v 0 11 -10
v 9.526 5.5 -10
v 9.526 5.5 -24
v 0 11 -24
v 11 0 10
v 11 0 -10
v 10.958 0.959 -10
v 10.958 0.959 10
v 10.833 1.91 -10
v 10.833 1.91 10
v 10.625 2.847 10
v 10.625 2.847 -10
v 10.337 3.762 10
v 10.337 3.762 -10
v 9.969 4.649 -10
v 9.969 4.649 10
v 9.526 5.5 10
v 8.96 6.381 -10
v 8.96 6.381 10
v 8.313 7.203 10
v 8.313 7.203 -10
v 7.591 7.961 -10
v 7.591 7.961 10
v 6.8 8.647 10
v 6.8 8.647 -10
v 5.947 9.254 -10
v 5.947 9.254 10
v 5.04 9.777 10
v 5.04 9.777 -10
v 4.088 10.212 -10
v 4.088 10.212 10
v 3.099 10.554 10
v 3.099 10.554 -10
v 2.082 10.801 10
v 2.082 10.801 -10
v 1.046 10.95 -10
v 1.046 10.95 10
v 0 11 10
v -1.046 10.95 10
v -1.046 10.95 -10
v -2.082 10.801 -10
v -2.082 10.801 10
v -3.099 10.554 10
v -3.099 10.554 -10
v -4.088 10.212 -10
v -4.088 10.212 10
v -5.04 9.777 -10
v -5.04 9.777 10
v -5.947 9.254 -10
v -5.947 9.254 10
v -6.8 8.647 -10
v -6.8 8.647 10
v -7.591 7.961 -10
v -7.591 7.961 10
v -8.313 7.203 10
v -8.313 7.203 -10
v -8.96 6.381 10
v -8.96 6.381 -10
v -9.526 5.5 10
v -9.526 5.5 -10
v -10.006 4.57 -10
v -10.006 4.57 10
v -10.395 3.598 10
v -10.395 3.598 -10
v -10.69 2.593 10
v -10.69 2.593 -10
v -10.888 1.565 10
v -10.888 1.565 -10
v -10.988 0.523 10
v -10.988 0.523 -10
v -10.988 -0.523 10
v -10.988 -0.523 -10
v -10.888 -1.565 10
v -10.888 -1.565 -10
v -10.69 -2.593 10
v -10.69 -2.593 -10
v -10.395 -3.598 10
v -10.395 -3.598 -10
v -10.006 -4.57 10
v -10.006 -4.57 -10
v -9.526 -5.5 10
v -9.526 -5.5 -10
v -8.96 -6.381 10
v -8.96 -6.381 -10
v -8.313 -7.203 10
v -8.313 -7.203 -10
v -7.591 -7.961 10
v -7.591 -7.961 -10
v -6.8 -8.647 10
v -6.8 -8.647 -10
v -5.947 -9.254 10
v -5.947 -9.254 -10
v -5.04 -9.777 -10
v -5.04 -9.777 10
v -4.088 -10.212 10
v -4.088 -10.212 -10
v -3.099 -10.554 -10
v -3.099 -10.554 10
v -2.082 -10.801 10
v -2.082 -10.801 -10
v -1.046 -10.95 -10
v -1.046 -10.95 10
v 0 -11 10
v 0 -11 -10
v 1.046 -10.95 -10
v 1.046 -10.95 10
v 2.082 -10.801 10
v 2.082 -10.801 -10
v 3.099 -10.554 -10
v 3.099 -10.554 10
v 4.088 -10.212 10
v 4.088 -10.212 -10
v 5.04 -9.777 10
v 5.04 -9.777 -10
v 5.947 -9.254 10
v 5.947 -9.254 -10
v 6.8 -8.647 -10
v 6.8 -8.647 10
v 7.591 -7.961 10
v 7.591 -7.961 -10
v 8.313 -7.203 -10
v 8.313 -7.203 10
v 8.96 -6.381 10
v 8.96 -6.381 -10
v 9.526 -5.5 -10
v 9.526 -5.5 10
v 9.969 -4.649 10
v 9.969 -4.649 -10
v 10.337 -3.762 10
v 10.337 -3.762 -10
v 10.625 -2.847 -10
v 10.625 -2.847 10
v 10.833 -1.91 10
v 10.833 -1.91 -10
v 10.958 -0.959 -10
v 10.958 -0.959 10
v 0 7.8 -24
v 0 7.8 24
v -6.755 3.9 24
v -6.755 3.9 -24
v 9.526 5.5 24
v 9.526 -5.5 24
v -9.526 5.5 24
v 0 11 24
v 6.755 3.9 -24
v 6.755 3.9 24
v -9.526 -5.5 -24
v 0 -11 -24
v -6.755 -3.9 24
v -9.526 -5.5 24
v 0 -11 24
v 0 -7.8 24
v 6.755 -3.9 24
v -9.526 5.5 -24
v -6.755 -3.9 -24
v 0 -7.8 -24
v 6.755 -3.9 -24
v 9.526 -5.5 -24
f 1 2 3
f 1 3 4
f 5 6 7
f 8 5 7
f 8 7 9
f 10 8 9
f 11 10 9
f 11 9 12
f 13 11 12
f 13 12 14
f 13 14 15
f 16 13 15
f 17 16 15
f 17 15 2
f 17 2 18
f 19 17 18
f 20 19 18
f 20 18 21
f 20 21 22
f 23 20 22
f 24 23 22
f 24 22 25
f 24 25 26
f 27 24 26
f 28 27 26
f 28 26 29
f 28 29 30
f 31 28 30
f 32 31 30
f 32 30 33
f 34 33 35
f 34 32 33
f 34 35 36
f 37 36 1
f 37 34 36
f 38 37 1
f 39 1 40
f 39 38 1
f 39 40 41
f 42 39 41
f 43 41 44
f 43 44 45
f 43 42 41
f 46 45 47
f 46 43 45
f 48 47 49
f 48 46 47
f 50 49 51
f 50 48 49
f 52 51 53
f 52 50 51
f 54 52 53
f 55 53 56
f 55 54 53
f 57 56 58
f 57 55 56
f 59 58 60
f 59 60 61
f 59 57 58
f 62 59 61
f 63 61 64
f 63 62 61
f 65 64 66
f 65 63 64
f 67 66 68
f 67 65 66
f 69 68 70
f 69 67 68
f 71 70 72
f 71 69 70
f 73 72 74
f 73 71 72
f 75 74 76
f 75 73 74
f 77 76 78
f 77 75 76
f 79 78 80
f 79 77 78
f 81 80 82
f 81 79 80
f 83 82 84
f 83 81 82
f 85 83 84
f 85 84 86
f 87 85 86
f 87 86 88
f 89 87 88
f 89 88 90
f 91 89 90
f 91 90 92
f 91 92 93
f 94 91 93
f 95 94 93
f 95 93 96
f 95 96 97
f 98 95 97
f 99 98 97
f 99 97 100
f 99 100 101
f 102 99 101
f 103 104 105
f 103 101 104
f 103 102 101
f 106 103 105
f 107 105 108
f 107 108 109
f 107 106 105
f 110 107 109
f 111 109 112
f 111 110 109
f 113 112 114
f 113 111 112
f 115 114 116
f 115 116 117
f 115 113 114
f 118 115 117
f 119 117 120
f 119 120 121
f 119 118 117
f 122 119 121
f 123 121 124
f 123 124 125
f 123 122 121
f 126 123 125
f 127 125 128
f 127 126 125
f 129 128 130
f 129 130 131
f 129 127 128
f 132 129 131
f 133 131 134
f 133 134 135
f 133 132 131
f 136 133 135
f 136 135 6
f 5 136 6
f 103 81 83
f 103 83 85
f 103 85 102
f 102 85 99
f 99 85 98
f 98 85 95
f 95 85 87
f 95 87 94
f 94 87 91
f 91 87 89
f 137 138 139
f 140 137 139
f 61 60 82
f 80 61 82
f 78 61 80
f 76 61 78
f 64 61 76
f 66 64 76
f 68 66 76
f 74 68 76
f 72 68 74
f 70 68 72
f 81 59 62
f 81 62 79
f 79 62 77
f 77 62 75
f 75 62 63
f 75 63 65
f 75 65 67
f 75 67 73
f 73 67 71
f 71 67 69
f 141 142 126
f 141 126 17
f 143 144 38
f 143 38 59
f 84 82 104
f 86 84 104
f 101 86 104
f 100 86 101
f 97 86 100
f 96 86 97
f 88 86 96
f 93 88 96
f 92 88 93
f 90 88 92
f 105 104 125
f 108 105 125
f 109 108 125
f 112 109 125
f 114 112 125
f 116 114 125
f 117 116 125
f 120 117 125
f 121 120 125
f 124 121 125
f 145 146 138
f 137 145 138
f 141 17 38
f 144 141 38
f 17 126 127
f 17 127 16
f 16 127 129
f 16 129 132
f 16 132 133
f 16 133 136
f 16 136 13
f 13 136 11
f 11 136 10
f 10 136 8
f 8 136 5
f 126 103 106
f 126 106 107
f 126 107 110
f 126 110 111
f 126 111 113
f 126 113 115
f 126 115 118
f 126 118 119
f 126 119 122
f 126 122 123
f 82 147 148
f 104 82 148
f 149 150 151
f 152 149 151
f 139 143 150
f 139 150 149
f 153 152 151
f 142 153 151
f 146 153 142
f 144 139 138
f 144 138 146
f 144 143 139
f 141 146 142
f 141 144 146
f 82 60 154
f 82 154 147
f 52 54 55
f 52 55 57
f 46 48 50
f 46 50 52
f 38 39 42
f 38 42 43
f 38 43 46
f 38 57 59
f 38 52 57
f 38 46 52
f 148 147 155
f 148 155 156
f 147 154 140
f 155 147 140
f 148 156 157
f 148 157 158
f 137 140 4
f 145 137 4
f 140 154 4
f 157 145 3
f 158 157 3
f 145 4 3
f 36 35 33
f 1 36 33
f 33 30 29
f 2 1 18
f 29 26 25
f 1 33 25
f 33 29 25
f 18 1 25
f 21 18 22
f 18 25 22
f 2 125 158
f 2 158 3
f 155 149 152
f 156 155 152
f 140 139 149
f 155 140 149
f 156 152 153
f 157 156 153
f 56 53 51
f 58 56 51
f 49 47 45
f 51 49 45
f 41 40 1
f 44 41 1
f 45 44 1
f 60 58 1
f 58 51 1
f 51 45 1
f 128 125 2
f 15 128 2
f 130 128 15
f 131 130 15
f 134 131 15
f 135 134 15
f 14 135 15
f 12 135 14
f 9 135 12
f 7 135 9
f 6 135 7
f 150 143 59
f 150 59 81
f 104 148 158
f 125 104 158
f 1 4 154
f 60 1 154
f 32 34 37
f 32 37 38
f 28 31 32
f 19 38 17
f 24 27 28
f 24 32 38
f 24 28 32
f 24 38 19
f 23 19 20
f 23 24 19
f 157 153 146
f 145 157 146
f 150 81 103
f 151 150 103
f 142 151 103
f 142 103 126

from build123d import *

# Parameters (mm, degrees)
SKETCH1_R           = 11
SKETCH1_R_2         = 6.4
BOSS_EXTRUDE1_DEPTH = 10
BOSS_EXTRUDE2_DEPTH = 24
CUT_EXTRUDE3_DEPTH  = 51.457903246


with BuildPart() as part:
    # Sketch1 → Boss-Extrude1 (new, symmetric)
    with BuildSketch(Plane.XY):
        Circle(SKETCH1_R)
        Circle(SKETCH1_R_2, mode=Mode.SUBTRACT)
    extrude(amount=BOSS_EXTRUDE1_DEPTH, both=True)

    # Sketch1<3> → Boss-Extrude2 (add, symmetric)
    with BuildSketch(Plane.XY):
        Polygon((-9.526279442, -5.5), (0, -11), (9.526279442, -5.5), (9.526279442, 5.5), (0, 11), (-9.526279442, 5.5), align=None)
    extrude(amount=BOSS_EXTRUDE2_DEPTH, both=True)

    # Sketch2 → Cut-Extrude3 (cut, through all)
    with BuildSketch(Plane.XY.offset(24)):
        Polygon((0, -7.8), (6.75499815, -3.9), (6.75499815, 3.9), (0, 7.8), (-6.75499815, 3.9), (-6.75499815, -3.9), align=None)
    extrude(amount=-CUT_EXTRUDE3_DEPTH, mode=Mode.SUBTRACT)


solid = part.part
